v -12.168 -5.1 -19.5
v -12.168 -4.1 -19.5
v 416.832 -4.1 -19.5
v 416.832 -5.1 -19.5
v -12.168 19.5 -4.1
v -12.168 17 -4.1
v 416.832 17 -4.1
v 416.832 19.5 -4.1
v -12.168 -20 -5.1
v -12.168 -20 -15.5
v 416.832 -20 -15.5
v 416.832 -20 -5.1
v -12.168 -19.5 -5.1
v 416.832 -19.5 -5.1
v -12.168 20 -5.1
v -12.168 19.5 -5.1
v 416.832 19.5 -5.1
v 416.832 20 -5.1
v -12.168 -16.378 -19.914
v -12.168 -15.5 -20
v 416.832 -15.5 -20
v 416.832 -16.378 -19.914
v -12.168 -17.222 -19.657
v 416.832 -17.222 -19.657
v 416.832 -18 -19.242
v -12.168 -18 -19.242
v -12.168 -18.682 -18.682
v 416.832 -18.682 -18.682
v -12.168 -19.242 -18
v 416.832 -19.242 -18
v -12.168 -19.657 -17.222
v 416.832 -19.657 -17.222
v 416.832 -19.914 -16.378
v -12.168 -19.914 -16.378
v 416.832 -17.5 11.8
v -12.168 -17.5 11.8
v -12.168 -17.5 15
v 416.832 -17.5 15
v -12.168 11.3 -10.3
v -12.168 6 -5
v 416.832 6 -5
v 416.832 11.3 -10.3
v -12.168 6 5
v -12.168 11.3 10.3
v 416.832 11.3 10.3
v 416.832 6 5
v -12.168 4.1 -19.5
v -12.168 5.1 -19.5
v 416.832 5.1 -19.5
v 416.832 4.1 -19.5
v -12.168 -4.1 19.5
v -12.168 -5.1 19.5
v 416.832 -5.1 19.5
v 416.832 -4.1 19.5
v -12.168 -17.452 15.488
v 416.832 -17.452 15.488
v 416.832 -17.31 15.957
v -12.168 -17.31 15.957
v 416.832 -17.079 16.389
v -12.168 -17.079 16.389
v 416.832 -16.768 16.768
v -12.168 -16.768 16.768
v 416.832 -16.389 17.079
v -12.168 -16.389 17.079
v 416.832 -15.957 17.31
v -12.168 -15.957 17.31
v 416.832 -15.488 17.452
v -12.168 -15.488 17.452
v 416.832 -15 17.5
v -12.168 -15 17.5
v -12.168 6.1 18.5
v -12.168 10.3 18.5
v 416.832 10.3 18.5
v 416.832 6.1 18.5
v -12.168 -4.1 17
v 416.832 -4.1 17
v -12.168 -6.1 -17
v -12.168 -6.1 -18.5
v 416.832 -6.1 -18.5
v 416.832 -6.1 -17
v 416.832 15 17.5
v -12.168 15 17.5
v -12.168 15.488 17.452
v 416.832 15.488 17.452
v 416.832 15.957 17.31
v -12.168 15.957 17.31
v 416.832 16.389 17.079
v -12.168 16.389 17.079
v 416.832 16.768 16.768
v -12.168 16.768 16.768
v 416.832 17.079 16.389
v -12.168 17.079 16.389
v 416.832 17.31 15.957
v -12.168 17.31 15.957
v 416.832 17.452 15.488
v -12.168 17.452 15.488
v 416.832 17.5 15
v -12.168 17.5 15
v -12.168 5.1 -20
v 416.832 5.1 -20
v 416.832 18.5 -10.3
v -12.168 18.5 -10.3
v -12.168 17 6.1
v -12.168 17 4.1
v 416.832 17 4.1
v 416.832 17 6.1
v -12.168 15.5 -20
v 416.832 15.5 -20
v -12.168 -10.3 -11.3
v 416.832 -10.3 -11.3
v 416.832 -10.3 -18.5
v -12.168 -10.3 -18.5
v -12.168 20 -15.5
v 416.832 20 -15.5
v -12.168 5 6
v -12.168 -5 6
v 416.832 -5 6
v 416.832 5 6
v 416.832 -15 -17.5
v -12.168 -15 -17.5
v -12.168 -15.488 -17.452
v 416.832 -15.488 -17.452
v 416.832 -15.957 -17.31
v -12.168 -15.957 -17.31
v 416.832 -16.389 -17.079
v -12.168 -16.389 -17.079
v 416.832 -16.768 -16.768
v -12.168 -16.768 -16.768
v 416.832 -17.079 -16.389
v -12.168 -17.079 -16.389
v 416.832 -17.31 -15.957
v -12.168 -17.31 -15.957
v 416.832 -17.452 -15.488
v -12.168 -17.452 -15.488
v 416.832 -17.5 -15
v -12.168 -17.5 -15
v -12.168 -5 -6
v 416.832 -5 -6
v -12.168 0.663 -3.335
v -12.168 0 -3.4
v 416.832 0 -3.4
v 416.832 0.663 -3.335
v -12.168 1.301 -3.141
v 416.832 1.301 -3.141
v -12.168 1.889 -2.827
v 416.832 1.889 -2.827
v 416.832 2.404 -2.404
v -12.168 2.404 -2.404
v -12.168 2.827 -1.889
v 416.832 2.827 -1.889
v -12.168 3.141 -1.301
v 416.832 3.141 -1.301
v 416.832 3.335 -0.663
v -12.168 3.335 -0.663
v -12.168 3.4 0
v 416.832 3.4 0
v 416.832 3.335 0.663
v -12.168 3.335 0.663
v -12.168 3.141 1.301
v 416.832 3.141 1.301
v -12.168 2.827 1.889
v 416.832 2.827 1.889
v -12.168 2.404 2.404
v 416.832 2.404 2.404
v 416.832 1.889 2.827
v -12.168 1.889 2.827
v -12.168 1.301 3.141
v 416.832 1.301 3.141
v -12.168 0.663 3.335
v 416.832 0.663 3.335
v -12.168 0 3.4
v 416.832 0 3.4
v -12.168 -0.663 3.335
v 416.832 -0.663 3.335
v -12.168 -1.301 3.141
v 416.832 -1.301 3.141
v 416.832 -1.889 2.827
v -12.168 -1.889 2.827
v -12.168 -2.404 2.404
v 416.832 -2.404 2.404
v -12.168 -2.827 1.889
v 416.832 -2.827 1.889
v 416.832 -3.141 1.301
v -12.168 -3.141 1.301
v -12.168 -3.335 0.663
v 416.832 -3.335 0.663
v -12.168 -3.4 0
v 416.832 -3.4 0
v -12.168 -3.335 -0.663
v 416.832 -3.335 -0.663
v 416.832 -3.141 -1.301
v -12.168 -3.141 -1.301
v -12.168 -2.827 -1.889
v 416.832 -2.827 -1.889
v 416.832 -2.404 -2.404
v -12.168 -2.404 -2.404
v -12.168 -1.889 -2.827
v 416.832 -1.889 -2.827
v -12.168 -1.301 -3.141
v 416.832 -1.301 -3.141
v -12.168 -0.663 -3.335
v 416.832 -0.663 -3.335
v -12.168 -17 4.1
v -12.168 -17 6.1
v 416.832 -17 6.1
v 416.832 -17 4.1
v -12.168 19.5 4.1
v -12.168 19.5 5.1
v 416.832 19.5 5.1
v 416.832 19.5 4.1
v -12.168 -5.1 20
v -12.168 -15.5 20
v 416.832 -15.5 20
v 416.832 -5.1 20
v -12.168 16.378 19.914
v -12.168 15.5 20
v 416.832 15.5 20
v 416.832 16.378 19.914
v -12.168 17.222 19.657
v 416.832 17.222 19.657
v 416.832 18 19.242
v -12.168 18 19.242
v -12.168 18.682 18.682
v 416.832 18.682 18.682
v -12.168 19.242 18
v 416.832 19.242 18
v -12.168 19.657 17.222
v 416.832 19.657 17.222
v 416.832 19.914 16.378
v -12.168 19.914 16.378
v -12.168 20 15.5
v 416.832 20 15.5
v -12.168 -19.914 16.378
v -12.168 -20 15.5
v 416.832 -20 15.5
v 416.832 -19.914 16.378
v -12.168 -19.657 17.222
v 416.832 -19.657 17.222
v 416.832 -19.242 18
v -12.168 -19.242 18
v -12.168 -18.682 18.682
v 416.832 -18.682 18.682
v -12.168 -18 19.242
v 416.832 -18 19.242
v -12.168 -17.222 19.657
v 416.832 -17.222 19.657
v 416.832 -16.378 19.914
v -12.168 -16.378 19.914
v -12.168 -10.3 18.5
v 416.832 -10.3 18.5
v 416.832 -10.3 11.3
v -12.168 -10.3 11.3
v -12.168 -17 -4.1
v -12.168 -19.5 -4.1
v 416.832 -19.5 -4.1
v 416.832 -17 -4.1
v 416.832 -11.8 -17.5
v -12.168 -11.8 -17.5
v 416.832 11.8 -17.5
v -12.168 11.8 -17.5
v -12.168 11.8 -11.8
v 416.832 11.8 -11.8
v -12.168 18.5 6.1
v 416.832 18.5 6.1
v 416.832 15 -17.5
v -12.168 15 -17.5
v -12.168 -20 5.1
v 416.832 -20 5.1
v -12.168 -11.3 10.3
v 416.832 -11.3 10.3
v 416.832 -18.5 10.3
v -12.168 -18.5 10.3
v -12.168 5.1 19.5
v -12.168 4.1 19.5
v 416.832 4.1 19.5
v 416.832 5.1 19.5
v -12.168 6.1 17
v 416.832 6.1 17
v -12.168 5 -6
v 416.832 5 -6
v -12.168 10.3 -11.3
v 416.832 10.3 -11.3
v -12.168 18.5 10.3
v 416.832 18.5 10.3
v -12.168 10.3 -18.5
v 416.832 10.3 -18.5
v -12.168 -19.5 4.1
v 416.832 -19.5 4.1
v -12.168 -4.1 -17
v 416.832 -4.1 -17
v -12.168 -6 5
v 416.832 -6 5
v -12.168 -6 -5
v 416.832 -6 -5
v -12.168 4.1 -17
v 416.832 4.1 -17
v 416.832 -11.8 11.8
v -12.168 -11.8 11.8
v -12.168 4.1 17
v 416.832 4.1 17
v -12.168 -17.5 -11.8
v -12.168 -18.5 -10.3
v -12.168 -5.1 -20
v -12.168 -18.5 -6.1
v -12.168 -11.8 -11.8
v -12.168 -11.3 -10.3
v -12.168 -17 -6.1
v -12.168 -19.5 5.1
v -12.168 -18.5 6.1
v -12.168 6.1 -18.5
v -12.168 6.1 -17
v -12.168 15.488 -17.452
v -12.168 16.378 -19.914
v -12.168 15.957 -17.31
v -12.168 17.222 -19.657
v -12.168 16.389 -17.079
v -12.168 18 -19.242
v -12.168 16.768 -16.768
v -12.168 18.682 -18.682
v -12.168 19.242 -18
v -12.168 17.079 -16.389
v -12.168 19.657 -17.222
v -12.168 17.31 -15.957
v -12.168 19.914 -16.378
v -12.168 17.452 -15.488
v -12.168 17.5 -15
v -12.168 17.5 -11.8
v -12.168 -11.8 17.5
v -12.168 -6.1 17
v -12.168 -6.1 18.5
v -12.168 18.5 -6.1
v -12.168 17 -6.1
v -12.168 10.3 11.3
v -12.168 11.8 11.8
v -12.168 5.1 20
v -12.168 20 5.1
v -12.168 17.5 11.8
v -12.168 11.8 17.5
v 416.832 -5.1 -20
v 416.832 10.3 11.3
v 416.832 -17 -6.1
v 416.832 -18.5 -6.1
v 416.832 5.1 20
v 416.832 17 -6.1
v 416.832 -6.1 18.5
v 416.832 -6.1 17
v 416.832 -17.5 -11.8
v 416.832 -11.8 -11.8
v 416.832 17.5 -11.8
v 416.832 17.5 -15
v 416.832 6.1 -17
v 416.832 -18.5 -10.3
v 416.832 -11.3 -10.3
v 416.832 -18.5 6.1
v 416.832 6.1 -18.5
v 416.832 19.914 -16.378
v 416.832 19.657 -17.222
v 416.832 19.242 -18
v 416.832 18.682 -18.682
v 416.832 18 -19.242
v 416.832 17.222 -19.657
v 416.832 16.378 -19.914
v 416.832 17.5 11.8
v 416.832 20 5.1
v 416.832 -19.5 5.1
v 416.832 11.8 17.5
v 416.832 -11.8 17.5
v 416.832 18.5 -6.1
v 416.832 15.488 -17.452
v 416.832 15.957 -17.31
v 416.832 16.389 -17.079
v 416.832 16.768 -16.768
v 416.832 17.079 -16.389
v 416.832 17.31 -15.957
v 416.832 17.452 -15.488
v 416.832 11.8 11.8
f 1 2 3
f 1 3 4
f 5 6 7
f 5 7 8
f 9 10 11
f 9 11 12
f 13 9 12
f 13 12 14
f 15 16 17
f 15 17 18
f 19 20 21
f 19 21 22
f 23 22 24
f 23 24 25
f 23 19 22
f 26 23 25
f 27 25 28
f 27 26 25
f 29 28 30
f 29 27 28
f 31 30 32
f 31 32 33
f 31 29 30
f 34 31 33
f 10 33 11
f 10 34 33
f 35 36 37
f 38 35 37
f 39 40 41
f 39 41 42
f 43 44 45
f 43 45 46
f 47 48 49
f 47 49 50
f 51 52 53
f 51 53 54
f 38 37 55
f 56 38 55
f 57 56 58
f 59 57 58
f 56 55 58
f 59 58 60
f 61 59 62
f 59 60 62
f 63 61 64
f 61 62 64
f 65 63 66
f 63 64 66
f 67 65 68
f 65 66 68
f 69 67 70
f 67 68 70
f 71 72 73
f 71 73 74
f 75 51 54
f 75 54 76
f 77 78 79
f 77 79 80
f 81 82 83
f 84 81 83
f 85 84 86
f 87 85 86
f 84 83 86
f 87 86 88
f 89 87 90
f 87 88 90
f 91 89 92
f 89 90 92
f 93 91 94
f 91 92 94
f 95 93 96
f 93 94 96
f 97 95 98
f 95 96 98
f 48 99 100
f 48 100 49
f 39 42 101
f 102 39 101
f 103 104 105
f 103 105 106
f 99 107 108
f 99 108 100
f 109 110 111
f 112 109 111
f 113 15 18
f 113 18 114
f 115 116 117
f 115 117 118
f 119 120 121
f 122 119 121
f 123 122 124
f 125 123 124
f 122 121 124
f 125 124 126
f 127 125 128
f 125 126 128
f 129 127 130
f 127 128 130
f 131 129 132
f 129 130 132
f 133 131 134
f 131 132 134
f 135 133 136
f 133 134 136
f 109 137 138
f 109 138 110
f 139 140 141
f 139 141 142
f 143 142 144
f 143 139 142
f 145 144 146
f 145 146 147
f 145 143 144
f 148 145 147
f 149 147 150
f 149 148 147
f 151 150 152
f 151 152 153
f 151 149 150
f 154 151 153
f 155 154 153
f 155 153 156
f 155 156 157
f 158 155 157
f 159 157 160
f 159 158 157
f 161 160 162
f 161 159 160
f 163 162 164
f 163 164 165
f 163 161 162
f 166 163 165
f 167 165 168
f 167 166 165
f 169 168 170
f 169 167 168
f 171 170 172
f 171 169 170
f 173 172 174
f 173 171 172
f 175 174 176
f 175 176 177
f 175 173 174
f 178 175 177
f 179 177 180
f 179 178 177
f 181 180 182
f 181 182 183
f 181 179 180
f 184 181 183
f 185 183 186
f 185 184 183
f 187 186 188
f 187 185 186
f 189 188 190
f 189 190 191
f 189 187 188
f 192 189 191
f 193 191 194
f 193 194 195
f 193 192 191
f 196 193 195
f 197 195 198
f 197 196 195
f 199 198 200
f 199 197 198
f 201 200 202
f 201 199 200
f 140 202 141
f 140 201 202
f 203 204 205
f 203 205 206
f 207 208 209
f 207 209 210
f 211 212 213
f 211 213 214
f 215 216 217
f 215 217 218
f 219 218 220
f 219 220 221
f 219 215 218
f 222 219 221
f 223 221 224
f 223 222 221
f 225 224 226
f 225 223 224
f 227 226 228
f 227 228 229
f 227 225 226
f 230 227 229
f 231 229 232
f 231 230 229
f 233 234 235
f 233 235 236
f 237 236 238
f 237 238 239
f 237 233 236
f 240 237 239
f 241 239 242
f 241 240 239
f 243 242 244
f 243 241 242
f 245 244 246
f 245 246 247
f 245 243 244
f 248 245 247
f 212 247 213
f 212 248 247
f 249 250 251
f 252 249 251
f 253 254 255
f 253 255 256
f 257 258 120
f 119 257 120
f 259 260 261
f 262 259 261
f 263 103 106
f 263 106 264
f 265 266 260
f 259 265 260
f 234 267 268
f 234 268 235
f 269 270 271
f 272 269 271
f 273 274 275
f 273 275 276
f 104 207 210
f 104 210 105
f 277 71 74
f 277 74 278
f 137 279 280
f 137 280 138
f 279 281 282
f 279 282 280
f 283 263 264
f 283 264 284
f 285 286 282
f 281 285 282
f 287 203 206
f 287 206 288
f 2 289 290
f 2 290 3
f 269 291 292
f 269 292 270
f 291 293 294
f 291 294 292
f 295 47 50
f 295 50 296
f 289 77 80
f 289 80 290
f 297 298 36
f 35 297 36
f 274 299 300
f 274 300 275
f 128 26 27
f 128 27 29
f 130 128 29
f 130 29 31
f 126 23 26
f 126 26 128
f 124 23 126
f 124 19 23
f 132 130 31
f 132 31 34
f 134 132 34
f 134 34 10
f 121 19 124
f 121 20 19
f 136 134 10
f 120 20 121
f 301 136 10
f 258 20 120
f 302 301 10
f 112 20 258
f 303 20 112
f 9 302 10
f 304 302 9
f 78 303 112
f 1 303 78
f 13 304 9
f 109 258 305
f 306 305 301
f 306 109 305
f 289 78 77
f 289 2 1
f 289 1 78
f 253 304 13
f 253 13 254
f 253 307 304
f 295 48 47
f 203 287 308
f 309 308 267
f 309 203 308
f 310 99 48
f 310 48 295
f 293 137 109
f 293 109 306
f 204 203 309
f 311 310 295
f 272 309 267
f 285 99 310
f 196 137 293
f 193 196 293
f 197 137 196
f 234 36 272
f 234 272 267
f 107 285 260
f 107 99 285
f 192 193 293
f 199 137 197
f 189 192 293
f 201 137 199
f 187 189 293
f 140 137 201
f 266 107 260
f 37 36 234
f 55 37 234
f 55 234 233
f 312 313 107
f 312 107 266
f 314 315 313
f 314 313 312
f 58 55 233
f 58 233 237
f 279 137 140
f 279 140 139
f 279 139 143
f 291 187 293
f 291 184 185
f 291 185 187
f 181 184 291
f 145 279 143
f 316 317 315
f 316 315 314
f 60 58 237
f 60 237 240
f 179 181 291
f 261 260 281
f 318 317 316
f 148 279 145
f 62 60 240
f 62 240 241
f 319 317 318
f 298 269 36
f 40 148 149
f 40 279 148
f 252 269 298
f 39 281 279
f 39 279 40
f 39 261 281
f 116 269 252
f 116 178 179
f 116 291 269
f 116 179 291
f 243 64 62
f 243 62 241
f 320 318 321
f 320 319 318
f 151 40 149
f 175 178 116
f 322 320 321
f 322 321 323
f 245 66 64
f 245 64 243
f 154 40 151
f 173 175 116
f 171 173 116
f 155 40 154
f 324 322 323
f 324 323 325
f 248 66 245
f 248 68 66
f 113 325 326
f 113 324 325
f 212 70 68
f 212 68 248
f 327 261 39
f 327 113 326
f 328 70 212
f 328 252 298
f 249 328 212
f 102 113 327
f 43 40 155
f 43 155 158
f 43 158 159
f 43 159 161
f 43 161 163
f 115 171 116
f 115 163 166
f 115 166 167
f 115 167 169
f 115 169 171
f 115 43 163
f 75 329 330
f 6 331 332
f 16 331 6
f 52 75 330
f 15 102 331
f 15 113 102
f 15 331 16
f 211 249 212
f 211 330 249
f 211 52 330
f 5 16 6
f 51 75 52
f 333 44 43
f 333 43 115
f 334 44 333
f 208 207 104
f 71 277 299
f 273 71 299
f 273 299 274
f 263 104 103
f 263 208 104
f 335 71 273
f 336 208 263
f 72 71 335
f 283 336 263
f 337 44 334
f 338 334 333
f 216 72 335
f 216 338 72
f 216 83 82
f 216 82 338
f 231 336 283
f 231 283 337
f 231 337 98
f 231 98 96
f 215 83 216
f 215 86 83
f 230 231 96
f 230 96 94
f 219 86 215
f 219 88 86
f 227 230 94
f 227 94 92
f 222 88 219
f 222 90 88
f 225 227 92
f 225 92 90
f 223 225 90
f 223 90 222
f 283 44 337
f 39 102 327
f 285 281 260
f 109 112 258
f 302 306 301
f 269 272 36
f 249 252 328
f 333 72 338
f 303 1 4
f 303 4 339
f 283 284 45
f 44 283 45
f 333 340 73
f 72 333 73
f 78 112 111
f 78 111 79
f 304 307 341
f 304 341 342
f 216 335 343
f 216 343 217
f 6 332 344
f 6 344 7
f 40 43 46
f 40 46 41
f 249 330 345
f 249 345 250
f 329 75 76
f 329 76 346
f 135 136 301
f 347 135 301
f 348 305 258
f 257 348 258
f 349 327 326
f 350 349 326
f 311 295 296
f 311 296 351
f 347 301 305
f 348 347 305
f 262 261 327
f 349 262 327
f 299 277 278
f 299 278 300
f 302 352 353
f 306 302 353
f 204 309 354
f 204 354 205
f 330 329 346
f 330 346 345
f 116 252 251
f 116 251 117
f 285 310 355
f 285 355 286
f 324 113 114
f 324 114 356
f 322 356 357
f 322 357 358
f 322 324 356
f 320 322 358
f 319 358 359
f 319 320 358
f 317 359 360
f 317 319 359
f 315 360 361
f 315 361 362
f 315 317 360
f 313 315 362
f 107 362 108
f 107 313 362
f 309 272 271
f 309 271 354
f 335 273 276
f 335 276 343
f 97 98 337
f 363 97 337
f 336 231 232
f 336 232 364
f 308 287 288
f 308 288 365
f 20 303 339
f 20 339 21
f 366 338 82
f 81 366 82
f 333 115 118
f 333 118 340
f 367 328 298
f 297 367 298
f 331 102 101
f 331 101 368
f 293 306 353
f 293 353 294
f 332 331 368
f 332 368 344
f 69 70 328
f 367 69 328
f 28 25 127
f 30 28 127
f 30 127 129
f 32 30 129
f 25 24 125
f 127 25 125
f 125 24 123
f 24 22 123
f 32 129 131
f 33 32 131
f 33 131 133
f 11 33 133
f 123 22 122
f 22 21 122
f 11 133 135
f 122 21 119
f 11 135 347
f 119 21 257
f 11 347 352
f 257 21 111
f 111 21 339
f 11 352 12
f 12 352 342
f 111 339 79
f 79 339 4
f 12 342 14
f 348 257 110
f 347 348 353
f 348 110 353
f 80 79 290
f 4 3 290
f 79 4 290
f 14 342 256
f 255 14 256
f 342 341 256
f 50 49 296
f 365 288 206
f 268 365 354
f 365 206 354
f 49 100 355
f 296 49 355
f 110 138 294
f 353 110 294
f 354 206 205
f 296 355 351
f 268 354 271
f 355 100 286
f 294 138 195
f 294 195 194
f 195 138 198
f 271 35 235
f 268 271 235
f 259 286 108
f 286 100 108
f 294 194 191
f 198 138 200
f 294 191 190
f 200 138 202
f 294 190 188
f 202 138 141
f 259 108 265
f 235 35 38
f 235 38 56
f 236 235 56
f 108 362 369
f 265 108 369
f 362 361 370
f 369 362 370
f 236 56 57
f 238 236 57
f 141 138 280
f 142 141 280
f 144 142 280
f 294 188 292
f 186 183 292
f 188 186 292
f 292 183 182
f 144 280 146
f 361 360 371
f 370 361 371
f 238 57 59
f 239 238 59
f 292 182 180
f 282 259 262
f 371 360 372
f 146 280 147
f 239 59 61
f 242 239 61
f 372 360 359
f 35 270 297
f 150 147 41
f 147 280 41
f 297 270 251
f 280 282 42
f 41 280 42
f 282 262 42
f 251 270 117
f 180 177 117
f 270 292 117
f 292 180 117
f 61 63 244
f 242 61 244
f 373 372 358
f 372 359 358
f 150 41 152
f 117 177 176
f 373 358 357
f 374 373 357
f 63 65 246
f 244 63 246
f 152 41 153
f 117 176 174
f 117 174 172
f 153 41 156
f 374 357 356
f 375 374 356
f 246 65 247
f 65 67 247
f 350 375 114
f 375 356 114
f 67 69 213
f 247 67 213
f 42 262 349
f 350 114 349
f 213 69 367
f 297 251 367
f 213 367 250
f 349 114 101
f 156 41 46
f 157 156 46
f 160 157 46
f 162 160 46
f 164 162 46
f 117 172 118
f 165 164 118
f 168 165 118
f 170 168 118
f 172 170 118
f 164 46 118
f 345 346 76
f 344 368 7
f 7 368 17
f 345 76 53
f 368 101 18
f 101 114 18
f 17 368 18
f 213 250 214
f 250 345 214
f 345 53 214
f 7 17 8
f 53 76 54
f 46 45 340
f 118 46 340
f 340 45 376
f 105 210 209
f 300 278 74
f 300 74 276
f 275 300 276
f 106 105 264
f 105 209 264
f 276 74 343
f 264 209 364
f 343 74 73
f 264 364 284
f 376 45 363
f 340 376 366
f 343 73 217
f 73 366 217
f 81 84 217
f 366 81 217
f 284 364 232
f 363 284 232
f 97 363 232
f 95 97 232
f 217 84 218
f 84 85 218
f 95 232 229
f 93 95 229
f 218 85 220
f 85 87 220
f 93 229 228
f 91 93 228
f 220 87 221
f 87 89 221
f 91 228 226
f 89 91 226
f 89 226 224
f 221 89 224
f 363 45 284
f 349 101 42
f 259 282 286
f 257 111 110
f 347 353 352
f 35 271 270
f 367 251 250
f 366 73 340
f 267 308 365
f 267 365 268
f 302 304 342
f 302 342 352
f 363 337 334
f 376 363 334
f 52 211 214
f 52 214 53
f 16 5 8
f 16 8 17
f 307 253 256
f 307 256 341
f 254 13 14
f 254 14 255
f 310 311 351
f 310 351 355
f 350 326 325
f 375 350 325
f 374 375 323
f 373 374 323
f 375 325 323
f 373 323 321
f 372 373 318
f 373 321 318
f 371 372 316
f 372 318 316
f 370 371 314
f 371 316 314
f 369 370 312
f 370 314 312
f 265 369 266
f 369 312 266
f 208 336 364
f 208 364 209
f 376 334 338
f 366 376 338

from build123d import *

# Parameters (mm, degrees)
SKETCH1_R                 = 3.4
F_40_X_40L_X_R4_5_1_DEPTH = 429


with BuildPart() as part:
    # Sketch1 → 铝型材 40 X 40L X R4.5(1) (new body)
    with BuildSketch(Plane(origin=(-12.168141593, 0, 0), x_dir=(0, 0, -1), z_dir=(1, 0, 0))):
        with BuildLine():
            Line((-5.1, 20), (-5.1, 19.5))
            Line((-5.1, 19.5), (-4.1, 19.5))
            Line((-4.1, 19.5), (-4.1, 17))
            Line((-4.1, 17), (-6.1, 17))
            Line((-6.1, 17), (-6.1, 18.5))
            Line((-6.1, 18.5), (-10.3, 18.5))
            Line((-10.3, 18.5), (-10.3, 11.3))
            Line((-10.3, 11.3), (-5, 6))
            Line((-5, 6), (5, 6))
            Line((5, 6), (10.3, 11.3))
            Line((10.3, 11.3), (10.3, 18.5))
            Line((10.3, 18.5), (6.1, 18.5))
            Line((6.1, 18.5), (6.1, 17))
            Line((6.1, 17), (4.1, 17))
            Line((4.1, 17), (4.1, 19.5))
            Line((4.1, 19.5), (5.1, 19.5))
            Line((5.1, 19.5), (5.1, 20))
            Line((5.1, 20), (15.5, 20))
            ThreePointArc((15.5, 20), (18.681980515, 18.681980515), (20, 15.5))
            Line((20, 15.5), (20, 5.1))
            Line((20, 5.1), (19.5, 5.1))
            Line((19.5, 5.1), (19.5, 4.1))
            Line((19.5, 4.1), (17, 4.1))
            Line((17, 4.1), (17, 6.1))
            Line((17, 6.1), (18.5, 6.1))
            Line((18.5, 6.1), (18.5, 10.3))
            Line((18.5, 10.3), (11.3, 10.3))
            Line((11.3, 10.3), (6, 5))
            Line((6, 5), (6, -5))
            Line((6, -5), (11.3, -10.3))
            Line((11.3, -10.3), (18.5, -10.3))
            Line((18.5, -10.3), (18.5, -6.1))
            Line((18.5, -6.1), (17, -6.1))
            Line((17, -6.1), (17, -4.1))
            Line((17, -4.1), (19.5, -4.1))
            Line((19.5, -4.1), (19.5, -5.1))
            Line((19.5, -5.1), (20, -5.1))
            Line((20, -5.1), (20, -15.5))
            ThreePointArc((20, -15.5), (18.681980515, -18.681980515), (15.5, -20))
            Line((15.5, -20), (5.1, -20))
            Line((5.1, -20), (5.1, -19.5))
            Line((5.1, -19.5), (4.1, -19.5))
            Line((4.1, -19.5), (4.1, -17))
            Line((4.1, -17), (6.1, -17))
            Line((6.1, -17), (6.1, -18.5))
            Line((6.1, -18.5), (10.3, -18.5))
            Line((10.3, -18.5), (10.3, -11.3))
            Line((10.3, -11.3), (5, -6))
            Line((5, -6), (-5, -6))
            Line((-5, -6), (-10.3, -11.3))
            Line((-10.3, -11.3), (-10.3, -18.5))
            Line((-10.3, -18.5), (-6.1, -18.5))
            Line((-6.1, -18.5), (-6.1, -17))
            Line((-6.1, -17), (-4.1, -17))
            Line((-4.1, -17), (-4.1, -19.5))
            Line((-4.1, -19.5), (-5.1, -19.5))
            Line((-5.1, -19.5), (-5.1, -20))
            Line((-5.1, -20), (-15.5, -20))
            ThreePointArc((-15.5, -20), (-18.681980515, -18.681980515), (-20, -15.5))
            Line((-20, -15.5), (-20, -5.1))
            Line((-20, -5.1), (-19.5, -5.1))
            Line((-19.5, -5.1), (-19.5, -4.1))
            Line((-19.5, -4.1), (-17, -4.1))
            Line((-17, -4.1), (-17, -6.1))
            Line((-17, -6.1), (-18.5, -6.1))
            Line((-18.5, -6.1), (-18.5, -10.3))
            Line((-18.5, -10.3), (-11.3, -10.3))
            Line((-11.3, -10.3), (-6, -5))
            Line((-6, -5), (-6, 5))
            Line((-6, 5), (-11.3, 10.3))
            Line((-11.3, 10.3), (-18.5, 10.3))
            Line((-18.5, 10.3), (-18.5, 6.1))
            Line((-18.5, 6.1), (-17, 6.1))
            Line((-17, 6.1), (-17, 4.1))
            Line((-17, 4.1), (-19.5, 4.1))
            Line((-19.5, 4.1), (-19.5, 5.1))
            Line((-19.5, 5.1), (-20, 5.1))
            Line((-20, 5.1), (-20, 15.5))
            ThreePointArc((-20, 15.5), (-18.681980515, 18.681980515), (-15.5, 20))
            Line((-15.5, 20), (-5.1, 20))
        make_face()
        Circle(SKETCH1_R, mode=Mode.SUBTRACT)
        with BuildLine():
            Line((11.8, 17.5), (15, 17.5))
            ThreePointArc((15, 17.5), (16.767766953, 16.767766953), (17.5, 15))
            Line((17.5, 15), (17.5, 11.8))
            Line((17.5, 11.8), (11.8, 11.8))
            Line((11.8, 11.8), (11.8, 17.5))
        make_face(mode=Mode.SUBTRACT)
        with BuildLine():
            Line((-15, 17.5), (-11.8, 17.5))
            Line((-11.8, 17.5), (-11.8, 11.8))
            Line((-11.8, 11.8), (-17.5, 11.8))
            Line((-17.5, 11.8), (-17.5, 15))
            ThreePointArc((-17.5, 15), (-16.767766953, 16.767766953), (-15, 17.5))
        make_face(mode=Mode.SUBTRACT)
        with BuildLine():
            Line((-17.5, -11.8), (-11.8, -11.8))
            Line((-11.8, -11.8), (-11.8, -17.5))
            Line((-11.8, -17.5), (-15, -17.5))
            ThreePointArc((-15, -17.5), (-16.767766953, -16.767766953), (-17.5, -15))
            Line((-17.5, -15), (-17.5, -11.8))
        make_face(mode=Mode.SUBTRACT)
        with BuildLine():
            Line((11.8, -11.8), (17.5, -11.8))
            Line((17.5, -11.8), (17.5, -15))
            ThreePointArc((17.5, -15), (16.767766953, -16.767766953), (15, -17.5))
            Line((15, -17.5), (11.8, -17.5))
            Line((11.8, -17.5), (11.8, -11.8))
        make_face(mode=Mode.SUBTRACT)
    extrude(amount=F_40_X_40L_X_R4_5_1_DEPTH)


solid = part.part
